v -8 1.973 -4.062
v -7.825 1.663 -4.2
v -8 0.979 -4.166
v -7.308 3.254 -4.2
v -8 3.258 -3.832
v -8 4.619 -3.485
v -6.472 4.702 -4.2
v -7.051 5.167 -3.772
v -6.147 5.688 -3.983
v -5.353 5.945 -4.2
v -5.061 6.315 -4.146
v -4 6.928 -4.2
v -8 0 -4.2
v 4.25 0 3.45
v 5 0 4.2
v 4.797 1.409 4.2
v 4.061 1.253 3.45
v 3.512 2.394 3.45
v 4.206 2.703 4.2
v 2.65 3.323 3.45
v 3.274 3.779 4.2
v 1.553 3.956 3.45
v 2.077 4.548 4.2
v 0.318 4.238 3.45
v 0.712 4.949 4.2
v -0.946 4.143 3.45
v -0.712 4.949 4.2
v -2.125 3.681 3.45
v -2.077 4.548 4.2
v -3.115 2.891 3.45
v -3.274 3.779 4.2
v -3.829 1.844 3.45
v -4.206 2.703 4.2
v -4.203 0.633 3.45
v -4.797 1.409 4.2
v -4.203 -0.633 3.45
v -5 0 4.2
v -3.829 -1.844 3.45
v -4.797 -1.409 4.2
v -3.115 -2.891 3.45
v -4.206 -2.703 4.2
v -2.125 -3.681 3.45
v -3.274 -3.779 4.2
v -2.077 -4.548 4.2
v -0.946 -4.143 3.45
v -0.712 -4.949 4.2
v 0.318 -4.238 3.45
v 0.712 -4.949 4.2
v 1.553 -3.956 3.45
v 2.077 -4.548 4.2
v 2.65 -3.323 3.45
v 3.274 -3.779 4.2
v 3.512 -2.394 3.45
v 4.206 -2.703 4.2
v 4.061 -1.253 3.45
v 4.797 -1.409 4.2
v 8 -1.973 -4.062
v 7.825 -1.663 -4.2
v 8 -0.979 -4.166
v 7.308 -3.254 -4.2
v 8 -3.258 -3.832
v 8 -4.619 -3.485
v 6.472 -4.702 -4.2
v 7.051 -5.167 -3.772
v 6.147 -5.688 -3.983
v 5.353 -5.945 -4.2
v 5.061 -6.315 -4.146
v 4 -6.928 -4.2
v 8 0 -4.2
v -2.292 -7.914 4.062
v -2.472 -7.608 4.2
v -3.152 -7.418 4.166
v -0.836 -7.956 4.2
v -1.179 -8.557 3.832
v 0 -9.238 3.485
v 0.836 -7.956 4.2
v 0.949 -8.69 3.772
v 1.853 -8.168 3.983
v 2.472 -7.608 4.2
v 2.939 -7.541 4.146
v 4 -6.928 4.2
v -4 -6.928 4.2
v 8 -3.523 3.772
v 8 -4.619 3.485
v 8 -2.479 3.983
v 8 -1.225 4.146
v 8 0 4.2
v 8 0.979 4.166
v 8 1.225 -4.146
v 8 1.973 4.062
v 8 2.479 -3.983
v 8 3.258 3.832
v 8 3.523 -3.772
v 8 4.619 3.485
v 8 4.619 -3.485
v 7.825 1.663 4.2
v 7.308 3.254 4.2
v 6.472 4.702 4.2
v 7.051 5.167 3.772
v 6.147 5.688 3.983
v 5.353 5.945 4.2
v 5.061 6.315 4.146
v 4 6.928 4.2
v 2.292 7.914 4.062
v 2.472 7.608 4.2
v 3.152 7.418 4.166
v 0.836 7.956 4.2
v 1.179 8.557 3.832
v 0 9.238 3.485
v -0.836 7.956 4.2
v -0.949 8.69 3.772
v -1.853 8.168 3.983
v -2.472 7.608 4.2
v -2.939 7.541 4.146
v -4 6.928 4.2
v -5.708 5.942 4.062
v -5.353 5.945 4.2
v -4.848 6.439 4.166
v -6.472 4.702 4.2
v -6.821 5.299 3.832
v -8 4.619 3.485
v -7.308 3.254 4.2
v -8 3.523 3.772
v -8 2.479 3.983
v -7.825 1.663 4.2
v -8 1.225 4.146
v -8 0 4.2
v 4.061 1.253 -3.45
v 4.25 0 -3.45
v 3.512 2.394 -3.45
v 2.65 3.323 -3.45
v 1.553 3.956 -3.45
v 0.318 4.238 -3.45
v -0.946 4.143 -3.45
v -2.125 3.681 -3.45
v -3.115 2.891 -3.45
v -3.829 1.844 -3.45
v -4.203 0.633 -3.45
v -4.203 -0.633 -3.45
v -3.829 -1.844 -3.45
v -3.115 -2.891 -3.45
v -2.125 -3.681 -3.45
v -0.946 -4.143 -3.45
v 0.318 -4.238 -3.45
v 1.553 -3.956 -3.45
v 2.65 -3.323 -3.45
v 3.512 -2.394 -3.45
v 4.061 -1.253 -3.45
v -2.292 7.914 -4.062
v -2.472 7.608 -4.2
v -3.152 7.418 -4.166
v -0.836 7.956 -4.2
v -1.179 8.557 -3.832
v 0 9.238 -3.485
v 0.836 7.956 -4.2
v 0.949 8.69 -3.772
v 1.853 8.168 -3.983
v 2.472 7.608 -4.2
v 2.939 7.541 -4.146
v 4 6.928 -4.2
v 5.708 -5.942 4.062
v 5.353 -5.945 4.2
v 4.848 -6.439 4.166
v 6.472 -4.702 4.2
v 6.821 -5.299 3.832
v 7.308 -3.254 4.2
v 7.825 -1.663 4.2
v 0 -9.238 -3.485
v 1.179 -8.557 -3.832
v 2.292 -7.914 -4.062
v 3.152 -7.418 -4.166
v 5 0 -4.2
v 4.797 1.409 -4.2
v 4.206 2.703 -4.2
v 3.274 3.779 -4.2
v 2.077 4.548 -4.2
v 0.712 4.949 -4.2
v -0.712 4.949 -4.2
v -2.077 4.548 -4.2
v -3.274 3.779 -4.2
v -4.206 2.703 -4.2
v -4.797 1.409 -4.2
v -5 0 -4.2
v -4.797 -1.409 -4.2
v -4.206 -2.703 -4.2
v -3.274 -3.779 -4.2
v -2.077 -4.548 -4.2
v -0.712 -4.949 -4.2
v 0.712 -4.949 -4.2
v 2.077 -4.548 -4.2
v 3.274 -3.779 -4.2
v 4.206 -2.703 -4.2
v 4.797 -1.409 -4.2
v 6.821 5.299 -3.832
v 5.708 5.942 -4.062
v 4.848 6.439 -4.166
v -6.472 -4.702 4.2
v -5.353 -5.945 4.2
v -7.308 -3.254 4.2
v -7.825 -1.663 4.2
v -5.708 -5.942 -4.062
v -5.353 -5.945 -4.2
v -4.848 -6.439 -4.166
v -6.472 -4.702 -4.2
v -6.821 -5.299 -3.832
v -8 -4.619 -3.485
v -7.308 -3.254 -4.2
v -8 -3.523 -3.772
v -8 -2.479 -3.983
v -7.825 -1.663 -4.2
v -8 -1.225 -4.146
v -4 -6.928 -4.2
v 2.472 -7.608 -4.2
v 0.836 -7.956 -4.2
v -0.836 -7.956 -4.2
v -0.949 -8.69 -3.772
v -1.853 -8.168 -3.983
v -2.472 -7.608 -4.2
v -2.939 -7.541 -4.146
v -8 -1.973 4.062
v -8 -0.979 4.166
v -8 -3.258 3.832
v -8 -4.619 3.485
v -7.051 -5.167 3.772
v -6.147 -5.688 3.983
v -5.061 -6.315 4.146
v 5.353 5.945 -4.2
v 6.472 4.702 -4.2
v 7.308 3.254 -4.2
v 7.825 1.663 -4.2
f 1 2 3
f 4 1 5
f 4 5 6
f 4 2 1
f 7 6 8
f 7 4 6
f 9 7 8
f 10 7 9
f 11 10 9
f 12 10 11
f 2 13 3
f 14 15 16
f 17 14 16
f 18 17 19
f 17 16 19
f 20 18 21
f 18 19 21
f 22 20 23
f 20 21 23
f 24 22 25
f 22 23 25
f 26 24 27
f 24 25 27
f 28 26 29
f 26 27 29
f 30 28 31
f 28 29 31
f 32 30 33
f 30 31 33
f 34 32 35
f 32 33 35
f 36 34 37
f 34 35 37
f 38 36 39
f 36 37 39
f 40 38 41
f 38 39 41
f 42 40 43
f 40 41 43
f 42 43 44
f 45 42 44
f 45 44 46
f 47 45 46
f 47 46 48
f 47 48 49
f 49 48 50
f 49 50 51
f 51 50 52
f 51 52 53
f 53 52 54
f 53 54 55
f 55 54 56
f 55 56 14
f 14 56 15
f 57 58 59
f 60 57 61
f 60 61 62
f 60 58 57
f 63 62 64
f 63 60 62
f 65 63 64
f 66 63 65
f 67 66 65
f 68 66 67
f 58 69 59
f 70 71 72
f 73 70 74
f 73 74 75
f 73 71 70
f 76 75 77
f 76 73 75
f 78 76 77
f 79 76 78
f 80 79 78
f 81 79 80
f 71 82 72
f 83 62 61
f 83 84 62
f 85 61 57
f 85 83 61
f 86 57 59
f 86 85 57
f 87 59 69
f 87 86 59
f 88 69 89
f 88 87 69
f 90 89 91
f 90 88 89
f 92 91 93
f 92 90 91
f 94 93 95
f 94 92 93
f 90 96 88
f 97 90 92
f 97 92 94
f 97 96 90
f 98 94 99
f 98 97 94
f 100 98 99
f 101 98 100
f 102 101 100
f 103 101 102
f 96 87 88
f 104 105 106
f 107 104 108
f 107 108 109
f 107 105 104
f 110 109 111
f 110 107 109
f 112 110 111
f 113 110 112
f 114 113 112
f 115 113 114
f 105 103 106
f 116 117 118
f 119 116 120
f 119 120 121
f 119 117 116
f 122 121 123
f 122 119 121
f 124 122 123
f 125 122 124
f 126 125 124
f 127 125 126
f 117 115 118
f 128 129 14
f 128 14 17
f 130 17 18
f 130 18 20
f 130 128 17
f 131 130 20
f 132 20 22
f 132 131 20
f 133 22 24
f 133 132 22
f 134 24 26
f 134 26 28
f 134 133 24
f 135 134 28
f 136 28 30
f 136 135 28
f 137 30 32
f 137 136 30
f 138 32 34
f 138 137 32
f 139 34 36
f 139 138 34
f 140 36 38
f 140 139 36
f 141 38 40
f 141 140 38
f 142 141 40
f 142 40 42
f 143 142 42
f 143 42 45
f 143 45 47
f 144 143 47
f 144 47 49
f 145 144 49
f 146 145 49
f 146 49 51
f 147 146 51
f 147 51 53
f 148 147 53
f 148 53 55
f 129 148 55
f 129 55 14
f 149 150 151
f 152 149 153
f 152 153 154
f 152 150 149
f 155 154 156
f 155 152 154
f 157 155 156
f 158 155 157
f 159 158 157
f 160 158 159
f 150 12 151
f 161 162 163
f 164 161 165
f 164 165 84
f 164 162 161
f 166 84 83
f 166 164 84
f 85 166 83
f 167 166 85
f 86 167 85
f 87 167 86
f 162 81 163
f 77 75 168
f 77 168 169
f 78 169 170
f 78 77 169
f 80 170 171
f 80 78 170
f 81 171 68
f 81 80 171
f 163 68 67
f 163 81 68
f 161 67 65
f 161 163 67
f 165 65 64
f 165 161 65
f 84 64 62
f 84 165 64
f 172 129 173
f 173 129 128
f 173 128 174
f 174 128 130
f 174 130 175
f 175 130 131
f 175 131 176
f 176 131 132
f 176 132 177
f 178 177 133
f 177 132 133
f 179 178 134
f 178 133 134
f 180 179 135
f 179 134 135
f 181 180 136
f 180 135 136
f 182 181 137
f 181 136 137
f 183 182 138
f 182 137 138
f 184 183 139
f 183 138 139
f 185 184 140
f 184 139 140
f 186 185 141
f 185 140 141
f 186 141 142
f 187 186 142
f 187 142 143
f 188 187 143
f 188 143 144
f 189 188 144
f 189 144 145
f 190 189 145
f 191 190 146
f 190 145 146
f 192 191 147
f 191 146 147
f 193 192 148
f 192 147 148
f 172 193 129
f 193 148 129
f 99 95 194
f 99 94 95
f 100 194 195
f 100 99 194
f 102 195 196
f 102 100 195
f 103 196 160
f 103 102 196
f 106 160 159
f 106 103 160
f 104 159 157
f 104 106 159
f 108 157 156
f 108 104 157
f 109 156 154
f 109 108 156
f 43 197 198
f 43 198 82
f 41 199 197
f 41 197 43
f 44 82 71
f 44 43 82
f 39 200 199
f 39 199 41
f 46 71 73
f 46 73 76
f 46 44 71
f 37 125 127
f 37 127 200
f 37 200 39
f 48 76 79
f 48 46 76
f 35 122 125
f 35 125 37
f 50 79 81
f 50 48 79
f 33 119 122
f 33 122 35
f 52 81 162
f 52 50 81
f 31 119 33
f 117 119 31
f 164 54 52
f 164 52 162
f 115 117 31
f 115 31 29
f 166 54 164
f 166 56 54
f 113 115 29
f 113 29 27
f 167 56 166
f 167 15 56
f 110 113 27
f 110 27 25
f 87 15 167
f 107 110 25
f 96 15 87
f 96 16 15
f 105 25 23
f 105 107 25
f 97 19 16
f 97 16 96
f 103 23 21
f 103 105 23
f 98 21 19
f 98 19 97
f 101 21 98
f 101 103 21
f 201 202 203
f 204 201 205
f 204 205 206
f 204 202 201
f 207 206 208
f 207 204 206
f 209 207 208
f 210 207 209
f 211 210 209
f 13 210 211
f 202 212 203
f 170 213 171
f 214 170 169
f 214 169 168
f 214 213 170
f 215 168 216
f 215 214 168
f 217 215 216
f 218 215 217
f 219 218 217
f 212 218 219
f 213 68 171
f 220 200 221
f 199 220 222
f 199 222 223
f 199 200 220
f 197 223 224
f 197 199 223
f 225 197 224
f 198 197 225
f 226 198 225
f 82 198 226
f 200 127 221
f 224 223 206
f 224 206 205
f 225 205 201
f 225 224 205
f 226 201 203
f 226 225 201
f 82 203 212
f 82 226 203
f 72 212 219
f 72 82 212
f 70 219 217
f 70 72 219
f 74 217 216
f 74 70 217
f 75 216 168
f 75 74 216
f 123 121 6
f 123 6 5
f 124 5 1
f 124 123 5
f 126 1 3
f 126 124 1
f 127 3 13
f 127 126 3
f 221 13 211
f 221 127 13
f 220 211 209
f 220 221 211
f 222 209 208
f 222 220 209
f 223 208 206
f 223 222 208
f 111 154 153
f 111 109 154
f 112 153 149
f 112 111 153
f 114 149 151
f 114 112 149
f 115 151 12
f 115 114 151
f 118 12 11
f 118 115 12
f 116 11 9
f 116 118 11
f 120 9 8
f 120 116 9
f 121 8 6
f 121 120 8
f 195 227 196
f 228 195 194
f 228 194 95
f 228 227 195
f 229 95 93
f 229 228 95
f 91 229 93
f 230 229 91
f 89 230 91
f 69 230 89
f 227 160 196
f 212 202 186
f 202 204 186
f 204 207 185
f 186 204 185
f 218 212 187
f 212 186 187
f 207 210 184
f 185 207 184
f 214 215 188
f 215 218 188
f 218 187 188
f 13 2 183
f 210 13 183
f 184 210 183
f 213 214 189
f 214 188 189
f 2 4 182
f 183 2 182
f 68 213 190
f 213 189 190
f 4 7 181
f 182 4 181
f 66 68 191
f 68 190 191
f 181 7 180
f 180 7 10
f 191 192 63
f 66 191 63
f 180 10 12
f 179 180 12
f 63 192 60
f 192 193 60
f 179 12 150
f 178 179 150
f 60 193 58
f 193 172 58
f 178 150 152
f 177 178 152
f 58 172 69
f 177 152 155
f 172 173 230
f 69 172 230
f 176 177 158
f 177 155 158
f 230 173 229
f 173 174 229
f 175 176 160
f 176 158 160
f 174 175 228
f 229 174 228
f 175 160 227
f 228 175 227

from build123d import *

# Parameters (mm, degrees)
SKETCH1_R           = 4.25
BOSS_EXTRUDE1_DEPTH = 4.2
CHAMFER1_SIZE       = 0.75


with BuildPart() as part:
    # Sketch1 → Boss-Extrude1 (new, symmetric)
    with BuildSketch(Plane.XY):
        Polygon((0, 9.237604307), (-8, 4.618802154), (-8, -4.618802154), (0, -9.237604307), (8, -4.618802154), (8, 4.618802154), align=None)
        Circle(SKETCH1_R, mode=Mode.SUBTRACT)
    extrude(amount=BOSS_EXTRUDE1_DEPTH, both=True)

    # Sketch4 → Cut-Revolve5 (revolve, cut)
    with BuildSketch(Plane(origin=(0, 0, 0), x_dir=(0, 0, -1), z_dir=(1, 0, 0))):
        Polygon((3.48546882, 9.237604307), (4.2, 8), (4.2, 9.237604307), align=None)
    revolve(axis=Axis((0, 0, 0), (0, 0, -1)), mode=Mode.SUBTRACT)

    # Sketch5 → Cut-Revolve6 (revolve, cut)
    with BuildSketch(Plane(origin=(0, 0, 0), x_dir=(0, 0, -1), z_dir=(1, 0, 0))):
        Polygon((-3.48546882, 9.237604307), (-4.2, 8), (-4.2, 9.237604307), align=None)
    revolve(axis=Axis((0, 0, 0), (0, 0, 1)), mode=Mode.SUBTRACT)

    # Chamfer1
    chamfer1_edges = [part.edges().sort_by_distance(p)[0] for p in [
        (-4.25, 0, -4.2),
        (-4.25, 0, 4.2),
    ]]
    chamfer(chamfer1_edges, length=CHAMFER1_SIZE)


solid = part.part
